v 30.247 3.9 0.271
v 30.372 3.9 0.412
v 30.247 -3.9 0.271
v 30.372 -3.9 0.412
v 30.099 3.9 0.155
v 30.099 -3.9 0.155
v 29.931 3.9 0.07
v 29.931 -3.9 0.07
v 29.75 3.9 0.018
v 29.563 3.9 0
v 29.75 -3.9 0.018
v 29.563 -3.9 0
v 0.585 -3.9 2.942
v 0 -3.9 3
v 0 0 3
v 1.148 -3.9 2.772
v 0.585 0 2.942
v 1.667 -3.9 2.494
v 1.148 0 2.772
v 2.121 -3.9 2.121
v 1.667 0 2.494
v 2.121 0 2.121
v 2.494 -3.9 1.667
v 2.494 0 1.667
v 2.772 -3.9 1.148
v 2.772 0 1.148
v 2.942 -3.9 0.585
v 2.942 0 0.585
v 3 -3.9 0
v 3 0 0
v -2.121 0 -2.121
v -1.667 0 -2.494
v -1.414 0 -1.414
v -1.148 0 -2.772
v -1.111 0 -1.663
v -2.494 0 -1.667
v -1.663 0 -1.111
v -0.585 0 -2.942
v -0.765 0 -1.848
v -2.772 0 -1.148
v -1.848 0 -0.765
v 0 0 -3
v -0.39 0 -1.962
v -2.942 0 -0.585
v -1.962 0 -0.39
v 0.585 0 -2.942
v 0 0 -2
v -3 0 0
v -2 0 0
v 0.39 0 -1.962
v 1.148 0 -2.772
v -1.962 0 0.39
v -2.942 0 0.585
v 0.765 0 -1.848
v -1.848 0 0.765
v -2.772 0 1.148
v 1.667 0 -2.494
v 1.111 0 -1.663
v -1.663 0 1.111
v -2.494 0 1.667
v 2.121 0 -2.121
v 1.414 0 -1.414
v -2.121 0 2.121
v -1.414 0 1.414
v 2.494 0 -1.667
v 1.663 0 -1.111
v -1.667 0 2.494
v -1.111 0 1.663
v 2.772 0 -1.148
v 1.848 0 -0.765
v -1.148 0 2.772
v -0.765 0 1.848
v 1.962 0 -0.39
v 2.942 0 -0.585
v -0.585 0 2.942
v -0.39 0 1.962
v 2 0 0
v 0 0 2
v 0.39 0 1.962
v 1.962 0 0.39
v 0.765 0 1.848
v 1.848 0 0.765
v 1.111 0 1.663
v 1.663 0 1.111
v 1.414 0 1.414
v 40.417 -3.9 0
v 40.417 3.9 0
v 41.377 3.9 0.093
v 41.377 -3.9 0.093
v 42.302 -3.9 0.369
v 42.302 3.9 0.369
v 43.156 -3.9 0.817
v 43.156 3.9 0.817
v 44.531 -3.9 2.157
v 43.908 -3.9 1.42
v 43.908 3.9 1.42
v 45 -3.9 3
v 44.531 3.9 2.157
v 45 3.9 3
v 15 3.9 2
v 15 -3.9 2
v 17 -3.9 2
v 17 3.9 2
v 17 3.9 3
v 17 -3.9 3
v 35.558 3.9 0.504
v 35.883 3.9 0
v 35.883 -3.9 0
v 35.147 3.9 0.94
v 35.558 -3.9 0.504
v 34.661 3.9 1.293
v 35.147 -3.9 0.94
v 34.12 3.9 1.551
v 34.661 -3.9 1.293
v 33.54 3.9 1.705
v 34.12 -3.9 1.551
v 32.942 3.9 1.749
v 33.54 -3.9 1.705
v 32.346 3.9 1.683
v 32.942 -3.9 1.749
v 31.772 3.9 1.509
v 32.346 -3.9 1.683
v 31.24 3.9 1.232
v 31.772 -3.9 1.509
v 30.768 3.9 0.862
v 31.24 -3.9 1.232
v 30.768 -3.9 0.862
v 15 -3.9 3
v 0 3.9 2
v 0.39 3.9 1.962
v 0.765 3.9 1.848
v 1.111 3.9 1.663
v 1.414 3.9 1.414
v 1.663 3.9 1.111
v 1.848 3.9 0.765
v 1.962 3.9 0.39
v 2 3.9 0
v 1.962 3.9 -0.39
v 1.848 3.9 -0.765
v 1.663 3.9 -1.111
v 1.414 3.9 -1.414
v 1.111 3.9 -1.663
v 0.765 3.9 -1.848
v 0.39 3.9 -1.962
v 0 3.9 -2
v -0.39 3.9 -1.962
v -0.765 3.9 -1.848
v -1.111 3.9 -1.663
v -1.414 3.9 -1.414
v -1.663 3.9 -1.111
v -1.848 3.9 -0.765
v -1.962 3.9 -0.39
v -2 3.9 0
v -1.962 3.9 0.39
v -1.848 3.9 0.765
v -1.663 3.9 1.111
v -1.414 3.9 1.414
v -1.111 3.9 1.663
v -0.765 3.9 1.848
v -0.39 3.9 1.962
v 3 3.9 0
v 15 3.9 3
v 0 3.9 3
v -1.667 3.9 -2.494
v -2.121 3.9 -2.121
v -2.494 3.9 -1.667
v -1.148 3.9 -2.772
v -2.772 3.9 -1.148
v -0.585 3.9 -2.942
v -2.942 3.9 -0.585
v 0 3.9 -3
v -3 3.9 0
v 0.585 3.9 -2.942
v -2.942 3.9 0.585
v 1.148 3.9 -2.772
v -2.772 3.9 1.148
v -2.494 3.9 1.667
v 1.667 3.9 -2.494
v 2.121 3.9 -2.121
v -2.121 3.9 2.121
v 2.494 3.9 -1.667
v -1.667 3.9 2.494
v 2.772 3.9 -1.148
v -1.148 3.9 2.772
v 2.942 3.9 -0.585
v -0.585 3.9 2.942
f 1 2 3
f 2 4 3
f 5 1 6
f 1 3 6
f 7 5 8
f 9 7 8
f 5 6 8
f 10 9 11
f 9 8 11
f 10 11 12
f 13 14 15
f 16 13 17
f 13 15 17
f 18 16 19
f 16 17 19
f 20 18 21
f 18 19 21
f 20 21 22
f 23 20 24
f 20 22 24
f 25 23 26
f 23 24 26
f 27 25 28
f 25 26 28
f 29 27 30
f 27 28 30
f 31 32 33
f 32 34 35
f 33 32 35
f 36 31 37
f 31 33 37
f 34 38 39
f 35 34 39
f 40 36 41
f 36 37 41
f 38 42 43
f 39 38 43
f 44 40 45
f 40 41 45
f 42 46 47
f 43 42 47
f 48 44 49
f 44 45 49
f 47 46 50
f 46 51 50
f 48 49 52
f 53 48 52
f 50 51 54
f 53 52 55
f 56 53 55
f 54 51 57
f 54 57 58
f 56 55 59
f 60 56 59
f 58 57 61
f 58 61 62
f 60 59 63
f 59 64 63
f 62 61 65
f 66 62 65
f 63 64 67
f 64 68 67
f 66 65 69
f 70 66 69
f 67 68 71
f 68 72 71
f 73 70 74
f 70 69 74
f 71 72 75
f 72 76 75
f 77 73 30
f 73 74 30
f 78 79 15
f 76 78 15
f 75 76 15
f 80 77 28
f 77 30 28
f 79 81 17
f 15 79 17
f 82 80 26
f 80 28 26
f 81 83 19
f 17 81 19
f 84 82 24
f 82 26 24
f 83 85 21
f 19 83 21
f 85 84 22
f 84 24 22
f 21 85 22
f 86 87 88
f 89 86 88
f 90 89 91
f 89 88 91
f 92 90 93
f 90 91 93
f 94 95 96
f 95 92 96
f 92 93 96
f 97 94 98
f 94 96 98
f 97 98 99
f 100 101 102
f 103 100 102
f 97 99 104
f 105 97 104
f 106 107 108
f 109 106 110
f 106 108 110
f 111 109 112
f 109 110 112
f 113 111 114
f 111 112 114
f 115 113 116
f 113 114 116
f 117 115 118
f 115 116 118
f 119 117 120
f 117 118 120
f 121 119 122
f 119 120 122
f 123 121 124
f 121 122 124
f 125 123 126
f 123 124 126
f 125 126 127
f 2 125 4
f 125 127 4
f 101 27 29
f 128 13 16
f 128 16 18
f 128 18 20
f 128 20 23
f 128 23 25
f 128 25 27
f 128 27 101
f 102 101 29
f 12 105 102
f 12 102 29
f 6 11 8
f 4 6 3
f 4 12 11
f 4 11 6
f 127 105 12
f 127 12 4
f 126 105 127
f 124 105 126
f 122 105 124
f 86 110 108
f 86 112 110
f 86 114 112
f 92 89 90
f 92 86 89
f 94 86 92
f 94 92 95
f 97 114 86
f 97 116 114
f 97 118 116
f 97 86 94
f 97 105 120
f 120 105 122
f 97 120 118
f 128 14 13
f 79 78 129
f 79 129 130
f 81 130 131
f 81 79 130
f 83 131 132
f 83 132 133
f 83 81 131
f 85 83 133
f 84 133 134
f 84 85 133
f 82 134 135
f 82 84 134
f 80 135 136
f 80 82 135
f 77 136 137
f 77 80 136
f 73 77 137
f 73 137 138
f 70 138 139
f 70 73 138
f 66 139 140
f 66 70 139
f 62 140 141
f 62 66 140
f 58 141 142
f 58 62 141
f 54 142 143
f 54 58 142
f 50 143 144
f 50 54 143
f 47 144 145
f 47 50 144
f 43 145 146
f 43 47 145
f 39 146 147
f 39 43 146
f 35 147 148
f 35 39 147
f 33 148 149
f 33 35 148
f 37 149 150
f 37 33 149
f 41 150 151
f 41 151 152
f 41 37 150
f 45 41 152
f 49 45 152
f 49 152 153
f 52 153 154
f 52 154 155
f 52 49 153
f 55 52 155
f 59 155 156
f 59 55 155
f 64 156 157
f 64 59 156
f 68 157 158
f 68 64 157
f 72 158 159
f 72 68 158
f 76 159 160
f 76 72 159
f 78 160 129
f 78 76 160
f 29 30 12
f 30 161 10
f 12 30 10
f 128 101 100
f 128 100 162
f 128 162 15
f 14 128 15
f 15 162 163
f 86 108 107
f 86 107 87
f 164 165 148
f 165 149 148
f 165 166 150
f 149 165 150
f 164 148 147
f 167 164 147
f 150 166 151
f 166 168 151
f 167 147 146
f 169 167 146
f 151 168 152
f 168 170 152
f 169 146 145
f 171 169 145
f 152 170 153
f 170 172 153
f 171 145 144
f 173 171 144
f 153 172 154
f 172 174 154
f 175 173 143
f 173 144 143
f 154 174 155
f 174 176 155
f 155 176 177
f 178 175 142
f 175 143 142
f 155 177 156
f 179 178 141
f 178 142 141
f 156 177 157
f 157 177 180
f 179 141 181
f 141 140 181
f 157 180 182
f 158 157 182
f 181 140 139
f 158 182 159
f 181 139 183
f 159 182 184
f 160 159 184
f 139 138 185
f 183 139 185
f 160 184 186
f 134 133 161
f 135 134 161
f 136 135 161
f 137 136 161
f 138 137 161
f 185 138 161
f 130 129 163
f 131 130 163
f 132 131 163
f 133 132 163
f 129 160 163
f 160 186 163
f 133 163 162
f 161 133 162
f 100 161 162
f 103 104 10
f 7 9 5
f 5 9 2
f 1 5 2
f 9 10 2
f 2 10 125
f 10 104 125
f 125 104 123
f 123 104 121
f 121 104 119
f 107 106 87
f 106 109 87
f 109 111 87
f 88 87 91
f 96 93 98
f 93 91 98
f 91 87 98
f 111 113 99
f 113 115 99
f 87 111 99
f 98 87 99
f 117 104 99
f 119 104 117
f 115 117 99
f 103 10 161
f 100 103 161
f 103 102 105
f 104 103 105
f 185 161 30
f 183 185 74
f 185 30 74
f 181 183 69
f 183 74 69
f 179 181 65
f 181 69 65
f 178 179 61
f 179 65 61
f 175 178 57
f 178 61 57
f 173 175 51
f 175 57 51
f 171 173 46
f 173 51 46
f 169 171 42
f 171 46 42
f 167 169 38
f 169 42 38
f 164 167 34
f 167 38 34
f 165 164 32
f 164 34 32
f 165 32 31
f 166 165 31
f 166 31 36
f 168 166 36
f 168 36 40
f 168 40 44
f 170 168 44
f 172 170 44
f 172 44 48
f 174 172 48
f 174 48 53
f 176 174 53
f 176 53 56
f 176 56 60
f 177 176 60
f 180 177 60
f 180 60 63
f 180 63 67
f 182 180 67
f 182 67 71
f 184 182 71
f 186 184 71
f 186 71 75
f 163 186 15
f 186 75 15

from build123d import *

# Parameters (mm, degrees)
CROQUIS1_R                   = 3
CROQUIS1_R_2                 = 2
SALIENTE_EXTRUIR1_DEPTH      = 3.9
SALIENTE_EXTRUIR2_DEPTH      = 3.9
SALIENTE_EXTRUIR2_DEPTH_BACK = 3.9
REDONDEO1_R                  = 5
CROQUIS4_W                   = 2
CROQUIS4_H                   = 2
CORTAR_EXTRUIR1_DEPTH        = 46.769422107
CROQUIS5_R                   = 3.25
CORTAR_EXTRUIR2_DEPTH        = 46.769422107
REDONDEO3_R                  = 1


with BuildPart() as part:
    # Croquis1 → Saliente-Extruir1 (new body)
    with BuildSketch(Plane(origin=(0, 0, 0), x_dir=(1, 0, 0), z_dir=(0, 1, 0))):
        with Locations(Location((0, 0, 0), (0, 0, 270))):
            Circle(CROQUIS1_R)
        with Locations(Location((0, 0, 0), (0, 0, 270))):
            Circle(CROQUIS1_R_2, mode=Mode.SUBTRACT)
    extrude(amount=SALIENTE_EXTRUIR1_DEPTH)

    # Croquis3 → Saliente-Extruir2 (add, two sides: drawn at the far end of the back side and taken through both)
    with BuildSketch(Plane.XZ.offset(-SALIENTE_EXTRUIR2_DEPTH_BACK)):
        with BuildLine():
            Line((45, 3), (0, 3))
            ThreePointArc((0, 3), (2.121320344, 2.121320344), (3, 0))
            Line((3, 0), (45, 0))
            Line((45, 0), (45, 3))
        make_face()
    extrude(amount=SALIENTE_EXTRUIR2_DEPTH + SALIENTE_EXTRUIR2_DEPTH_BACK)

    # Redondeo1
    # the kernel refuses this fillet: 5 mm, written as the material it takes off along each edge
    with BuildSketch(Plane(origin=(45, 15.356439237, 0), x_dir=(-1, 0, 0), z_dir=(0, -1, 0))) as redondeo1_piece_1:
        with BuildLine():
            CenterArc((4.582575695, -5), REDONDEO1_R, 90, 66.421821522)
            Line((0, -3), (-0.091651514, -2.96))
            ThreePointArc((-0.091651514, -2.96), (-0.1, -1.5), (-0.1, 0))
            Line((-0.1, 0), (0, 0.1))
            Line((0, 0.1), (4.582575695, 0.1))
            Line((4.582575695, 0.1), (4.582575695, 0))
        make_face()
    extrude(amount=30.712878475, mode=Mode.SUBTRACT)

    # Croquis4 → Cortar-Extruir1 (cut, through all)
    with BuildSketch(Plane.XZ.offset(3.9)):
        with Locations((16, 3)):
            Rectangle(CROQUIS4_W, CROQUIS4_H)
    extrude(amount=-CORTAR_EXTRUIR1_DEPTH, mode=Mode.SUBTRACT)

    # Croquis5 → Cortar-Extruir2 (cut, through all)
    with BuildSketch(Plane.XZ.offset(3.9)):
        with Locations((33, -1.5)):
            Circle(CROQUIS5_R)
    extrude(amount=-CORTAR_EXTRUIR2_DEPTH, mode=Mode.SUBTRACT)

    # Redondeo3
    redondeo3_edges = [part.edges().sort_by_distance(p)[0] for p in [
        (30.116859351, 0, 0),
    ]]
    fillet(redondeo3_edges, radius=REDONDEO3_R)


solid = part.part
